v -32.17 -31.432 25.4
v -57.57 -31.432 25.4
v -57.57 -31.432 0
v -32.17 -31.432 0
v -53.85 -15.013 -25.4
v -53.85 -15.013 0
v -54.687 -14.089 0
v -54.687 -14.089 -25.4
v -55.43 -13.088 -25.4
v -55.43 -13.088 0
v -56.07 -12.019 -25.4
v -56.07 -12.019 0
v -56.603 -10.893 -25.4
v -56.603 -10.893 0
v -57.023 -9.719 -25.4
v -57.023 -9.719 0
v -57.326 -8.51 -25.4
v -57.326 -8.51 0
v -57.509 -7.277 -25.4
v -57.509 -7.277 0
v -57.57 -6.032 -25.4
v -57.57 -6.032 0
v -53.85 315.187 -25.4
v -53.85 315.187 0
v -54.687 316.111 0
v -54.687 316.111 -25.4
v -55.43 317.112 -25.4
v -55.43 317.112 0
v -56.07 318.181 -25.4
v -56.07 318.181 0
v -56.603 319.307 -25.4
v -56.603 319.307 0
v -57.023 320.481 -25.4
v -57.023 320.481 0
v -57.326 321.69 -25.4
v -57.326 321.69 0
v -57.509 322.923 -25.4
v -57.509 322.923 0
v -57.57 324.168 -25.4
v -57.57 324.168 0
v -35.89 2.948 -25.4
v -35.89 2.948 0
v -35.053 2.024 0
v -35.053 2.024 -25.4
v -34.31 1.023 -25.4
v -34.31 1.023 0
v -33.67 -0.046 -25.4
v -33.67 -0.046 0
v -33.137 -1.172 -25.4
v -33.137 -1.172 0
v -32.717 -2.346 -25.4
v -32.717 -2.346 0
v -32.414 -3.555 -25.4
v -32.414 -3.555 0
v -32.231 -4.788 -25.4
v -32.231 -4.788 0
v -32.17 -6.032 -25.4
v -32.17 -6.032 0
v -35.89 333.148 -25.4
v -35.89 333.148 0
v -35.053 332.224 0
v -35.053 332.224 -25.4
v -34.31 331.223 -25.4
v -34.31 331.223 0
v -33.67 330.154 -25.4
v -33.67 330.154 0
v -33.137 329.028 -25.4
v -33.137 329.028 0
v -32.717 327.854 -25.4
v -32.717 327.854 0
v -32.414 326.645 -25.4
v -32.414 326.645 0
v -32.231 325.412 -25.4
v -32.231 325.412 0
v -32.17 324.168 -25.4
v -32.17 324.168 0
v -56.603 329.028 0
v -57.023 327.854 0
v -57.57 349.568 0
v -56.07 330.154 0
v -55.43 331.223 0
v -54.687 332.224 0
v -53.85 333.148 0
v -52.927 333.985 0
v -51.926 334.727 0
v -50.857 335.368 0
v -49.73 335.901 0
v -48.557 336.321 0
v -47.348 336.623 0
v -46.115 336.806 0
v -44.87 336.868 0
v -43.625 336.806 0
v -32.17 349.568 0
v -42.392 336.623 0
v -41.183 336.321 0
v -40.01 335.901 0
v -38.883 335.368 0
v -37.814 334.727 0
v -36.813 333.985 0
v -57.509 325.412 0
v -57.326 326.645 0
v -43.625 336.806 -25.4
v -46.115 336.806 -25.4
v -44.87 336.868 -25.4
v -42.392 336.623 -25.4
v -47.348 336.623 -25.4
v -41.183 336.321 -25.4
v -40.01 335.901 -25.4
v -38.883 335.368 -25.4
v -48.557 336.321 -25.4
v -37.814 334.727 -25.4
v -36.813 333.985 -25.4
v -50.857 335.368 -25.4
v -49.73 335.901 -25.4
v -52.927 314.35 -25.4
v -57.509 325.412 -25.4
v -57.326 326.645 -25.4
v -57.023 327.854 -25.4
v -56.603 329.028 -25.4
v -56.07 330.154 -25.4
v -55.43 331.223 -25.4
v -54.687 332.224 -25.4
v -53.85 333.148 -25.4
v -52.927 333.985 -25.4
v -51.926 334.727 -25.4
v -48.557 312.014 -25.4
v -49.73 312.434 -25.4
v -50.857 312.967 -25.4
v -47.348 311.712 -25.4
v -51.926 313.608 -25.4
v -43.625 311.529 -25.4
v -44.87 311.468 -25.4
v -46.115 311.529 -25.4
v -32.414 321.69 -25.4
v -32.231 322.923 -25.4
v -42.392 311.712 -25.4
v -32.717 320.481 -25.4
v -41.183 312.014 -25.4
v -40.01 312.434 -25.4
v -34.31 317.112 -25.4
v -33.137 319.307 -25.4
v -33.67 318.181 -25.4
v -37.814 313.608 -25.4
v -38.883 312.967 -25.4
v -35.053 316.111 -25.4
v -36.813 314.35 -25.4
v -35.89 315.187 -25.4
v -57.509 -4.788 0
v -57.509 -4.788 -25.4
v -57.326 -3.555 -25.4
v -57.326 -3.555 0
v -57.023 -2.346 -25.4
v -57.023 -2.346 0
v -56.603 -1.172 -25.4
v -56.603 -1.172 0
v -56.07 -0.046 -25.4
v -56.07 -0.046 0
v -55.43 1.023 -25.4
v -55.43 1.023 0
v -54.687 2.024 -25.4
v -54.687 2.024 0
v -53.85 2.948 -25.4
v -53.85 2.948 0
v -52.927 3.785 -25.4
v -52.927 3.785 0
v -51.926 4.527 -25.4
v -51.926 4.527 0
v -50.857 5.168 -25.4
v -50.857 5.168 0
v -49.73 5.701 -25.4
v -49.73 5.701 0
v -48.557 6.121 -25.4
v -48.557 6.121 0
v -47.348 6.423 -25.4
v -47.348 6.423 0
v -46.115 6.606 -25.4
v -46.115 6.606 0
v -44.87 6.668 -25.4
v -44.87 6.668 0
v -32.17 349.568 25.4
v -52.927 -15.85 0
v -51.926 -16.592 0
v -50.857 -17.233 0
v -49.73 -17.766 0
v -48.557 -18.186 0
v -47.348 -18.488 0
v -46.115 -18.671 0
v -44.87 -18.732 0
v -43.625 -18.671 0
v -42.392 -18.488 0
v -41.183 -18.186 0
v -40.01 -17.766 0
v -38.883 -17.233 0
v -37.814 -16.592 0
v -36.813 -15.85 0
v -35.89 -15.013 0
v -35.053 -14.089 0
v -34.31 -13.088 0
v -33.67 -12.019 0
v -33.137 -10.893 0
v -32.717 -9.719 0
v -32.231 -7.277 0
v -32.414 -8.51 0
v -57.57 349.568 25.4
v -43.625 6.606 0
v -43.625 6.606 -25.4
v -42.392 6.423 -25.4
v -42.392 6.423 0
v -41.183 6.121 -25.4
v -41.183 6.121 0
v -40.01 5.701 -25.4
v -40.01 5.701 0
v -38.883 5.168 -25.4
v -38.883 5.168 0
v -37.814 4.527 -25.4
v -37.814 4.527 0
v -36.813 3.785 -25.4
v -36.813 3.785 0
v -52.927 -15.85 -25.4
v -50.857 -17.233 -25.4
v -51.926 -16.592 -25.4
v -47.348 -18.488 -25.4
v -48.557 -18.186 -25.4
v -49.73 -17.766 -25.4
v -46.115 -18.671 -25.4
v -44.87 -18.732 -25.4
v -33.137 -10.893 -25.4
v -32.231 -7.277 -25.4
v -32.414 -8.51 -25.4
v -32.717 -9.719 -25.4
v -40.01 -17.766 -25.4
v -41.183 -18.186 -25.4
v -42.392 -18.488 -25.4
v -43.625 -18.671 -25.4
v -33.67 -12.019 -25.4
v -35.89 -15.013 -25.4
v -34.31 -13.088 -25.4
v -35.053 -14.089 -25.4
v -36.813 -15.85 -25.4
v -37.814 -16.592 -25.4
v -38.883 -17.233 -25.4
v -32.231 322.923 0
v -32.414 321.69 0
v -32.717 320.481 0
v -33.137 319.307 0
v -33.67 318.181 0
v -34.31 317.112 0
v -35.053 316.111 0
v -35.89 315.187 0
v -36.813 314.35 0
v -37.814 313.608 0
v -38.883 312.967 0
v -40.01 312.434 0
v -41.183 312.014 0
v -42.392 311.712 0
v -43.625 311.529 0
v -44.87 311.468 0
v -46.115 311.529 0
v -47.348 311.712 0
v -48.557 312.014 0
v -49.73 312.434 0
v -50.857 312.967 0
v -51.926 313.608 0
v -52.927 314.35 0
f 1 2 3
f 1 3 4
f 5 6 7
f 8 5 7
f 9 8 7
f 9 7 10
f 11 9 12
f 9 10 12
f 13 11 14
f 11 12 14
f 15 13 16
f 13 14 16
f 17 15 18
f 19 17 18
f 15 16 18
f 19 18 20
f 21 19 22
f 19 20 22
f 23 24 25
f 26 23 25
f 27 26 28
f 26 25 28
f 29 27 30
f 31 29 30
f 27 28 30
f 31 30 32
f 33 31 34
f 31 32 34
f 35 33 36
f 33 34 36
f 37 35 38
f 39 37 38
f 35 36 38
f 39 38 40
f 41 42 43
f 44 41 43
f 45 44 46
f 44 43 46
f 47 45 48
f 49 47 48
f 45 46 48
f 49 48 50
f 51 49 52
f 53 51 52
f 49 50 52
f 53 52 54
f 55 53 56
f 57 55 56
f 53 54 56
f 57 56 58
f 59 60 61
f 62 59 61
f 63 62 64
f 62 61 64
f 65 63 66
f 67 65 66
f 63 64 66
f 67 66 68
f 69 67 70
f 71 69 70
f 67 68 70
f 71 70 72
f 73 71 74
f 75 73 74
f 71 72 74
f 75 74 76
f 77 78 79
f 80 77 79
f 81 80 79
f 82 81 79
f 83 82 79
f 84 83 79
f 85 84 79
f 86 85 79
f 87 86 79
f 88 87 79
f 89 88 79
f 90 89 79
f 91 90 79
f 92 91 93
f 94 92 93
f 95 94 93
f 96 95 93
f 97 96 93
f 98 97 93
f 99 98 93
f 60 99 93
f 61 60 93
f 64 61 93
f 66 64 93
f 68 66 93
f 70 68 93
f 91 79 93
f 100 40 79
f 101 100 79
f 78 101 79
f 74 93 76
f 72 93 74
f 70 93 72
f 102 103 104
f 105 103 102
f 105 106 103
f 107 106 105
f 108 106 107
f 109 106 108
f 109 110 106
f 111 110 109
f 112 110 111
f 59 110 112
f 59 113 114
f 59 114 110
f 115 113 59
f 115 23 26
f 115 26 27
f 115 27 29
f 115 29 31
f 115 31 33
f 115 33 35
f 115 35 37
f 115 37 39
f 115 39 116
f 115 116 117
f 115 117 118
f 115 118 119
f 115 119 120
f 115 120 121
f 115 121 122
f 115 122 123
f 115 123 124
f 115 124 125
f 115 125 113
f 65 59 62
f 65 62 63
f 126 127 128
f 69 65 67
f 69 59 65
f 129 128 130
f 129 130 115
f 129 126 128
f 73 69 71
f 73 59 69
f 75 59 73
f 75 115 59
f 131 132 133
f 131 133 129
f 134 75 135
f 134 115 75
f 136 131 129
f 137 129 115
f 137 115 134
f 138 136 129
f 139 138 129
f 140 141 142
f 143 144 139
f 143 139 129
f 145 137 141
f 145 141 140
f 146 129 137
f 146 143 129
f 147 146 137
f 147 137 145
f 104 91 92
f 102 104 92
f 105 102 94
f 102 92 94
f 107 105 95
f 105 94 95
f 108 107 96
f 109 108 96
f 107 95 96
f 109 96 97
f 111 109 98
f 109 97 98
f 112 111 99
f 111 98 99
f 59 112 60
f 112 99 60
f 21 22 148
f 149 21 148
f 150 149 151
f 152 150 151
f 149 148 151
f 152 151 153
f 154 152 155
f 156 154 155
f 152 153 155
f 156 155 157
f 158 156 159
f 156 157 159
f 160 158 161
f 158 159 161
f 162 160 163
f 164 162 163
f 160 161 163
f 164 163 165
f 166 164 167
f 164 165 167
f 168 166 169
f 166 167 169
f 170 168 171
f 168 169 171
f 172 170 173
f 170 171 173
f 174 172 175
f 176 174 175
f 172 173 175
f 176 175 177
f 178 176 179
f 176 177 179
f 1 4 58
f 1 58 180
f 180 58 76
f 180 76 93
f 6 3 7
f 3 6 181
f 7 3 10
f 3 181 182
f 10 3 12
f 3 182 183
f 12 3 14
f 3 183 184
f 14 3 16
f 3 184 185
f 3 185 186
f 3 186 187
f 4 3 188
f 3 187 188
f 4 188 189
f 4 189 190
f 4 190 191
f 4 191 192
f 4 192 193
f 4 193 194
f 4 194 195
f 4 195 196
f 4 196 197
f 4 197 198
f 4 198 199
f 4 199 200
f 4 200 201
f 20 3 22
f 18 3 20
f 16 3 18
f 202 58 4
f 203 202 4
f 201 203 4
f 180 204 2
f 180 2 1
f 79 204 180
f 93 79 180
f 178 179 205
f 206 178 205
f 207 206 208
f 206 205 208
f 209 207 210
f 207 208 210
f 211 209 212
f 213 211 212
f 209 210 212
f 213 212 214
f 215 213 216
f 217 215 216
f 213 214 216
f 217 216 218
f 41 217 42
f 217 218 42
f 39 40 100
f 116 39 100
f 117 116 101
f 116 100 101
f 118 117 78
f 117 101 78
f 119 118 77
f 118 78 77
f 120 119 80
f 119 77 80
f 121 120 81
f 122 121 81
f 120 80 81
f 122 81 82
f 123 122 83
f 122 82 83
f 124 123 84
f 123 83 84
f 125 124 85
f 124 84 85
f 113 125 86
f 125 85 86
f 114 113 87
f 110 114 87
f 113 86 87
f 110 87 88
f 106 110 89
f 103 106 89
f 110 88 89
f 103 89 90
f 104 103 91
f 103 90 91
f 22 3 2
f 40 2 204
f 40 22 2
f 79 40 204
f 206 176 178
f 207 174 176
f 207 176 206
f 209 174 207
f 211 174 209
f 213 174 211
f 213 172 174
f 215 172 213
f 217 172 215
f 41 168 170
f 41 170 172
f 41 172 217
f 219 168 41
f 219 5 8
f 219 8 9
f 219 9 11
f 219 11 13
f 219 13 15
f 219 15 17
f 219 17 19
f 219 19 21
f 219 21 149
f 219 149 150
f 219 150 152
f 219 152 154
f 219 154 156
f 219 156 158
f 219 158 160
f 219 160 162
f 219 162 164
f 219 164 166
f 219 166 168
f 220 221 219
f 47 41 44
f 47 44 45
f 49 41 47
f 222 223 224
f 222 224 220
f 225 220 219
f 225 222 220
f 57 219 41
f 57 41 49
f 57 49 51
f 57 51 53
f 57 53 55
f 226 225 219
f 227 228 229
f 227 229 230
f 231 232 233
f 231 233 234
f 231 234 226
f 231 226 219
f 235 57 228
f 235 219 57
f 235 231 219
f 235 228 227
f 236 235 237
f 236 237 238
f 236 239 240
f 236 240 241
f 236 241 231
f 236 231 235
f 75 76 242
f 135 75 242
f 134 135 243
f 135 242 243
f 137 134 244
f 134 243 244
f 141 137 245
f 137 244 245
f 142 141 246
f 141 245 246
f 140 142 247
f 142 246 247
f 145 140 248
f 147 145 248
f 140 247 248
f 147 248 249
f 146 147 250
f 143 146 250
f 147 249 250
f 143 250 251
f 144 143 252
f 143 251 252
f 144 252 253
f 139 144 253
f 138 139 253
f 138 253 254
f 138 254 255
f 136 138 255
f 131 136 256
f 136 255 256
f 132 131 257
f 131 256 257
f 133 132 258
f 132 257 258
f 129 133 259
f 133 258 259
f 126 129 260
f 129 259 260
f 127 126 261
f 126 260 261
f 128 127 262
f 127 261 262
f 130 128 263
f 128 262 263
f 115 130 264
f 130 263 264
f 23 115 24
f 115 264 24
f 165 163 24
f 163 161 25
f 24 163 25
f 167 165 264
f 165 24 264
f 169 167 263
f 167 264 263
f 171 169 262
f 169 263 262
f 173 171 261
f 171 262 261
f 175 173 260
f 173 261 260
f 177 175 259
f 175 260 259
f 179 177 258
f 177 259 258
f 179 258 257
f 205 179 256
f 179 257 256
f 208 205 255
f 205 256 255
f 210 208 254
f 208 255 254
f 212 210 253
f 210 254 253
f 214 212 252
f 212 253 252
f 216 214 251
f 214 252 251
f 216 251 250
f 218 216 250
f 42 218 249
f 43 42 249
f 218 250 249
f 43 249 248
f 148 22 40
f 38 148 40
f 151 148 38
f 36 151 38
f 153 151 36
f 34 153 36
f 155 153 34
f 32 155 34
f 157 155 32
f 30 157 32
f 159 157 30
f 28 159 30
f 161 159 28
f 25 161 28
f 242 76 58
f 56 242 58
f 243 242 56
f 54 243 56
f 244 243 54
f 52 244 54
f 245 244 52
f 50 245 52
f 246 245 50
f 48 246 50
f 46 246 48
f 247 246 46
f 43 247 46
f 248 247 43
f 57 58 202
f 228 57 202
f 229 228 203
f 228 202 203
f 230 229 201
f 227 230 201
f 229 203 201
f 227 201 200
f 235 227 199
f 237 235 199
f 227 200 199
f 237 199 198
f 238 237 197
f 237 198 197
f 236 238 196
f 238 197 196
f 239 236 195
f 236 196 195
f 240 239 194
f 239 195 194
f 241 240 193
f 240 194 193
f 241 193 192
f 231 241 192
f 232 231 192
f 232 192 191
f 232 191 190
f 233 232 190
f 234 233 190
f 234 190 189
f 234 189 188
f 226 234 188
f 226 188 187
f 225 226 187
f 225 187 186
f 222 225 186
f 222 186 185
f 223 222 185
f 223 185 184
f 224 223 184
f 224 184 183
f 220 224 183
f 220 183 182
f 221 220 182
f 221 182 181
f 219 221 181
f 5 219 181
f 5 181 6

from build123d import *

# Parameters (mm, degrees)
F0_R     = 12.7
F1_DEPTH = 25.4
F3_W     = 25.4
F3_H     = 381
F4_DEPTH = 25.4
F6_DEPTH = 50.8
F7_DEPTH = 25.4
F9_DEPTH = 25.4


with BuildPart() as f1:
    # F0 (on Top) → F1 (new body)
    with BuildSketch(Plane.XY):
        with Locations((-130.0663352013, -20.0254302472)):
            Circle(F0_R)
    extrude(amount=F1_DEPTH)


with BuildPart() as f4:
    # F3 (on Top) → F4 (new body)
    with BuildSketch(Plane.XY):
        with Locations((-44.869919461, 159.0675017536)):
            Rectangle(F3_W, F3_H)
    extrude(amount=F4_DEPTH)

    # F5 (on face) → F6 (join)
    with BuildSketch(Plane(origin=(0, 0, 0), x_dir=(1, 0, 0), z_dir=(0, 0, -1))):
        with BuildLine():
            ThreePointArc((-32.169919461, 6.0324982464), (-35.8896633399, 15.0127543675), (-44.869919461, 18.7324982464))
            ThreePointArc((-44.869919461, 18.7324982464), (-49.729999052, 17.7657683093), (-53.8501755821, 15.0127543675))
            Line((-53.8501755821, 15.0127543675), (-35.8896633399, -2.9477578746))
            ThreePointArc((-35.8896633399, -2.9477578746), (-33.1366493981, 1.1724186554), (-32.169919461, 6.0324982464))
        make_face()
        with BuildLine():
            ThreePointArc((-53.8501755821, 15.0127543675), (-56.6031895193, 10.8925778487), (-57.569919461, 6.0324982708))
            ThreePointArc((-57.569919461, 6.0324982708), (-53.8501755907, -2.947757866), (-44.869919461, -6.6675017536))
            ThreePointArc((-44.869919461, -6.6675017536), (-40.00983987, -5.7007718165), (-35.8896633399, -2.9477578746))
            Line((-35.8896633399, -2.9477578746), (-53.8501755821, 15.0127543675))
        make_face()
    extrude(amount=F6_DEPTH)

    # F7 (cut): a face of the model
    f7_faces = [f4.faces().sort_by_distance(p)[0] for p in [
        (-44.869919461, -6.0324982464, -50.8),
    ]]
    extrude(f7_faces, amount=-F7_DEPTH, mode=Mode.SUBTRACT)

    # F8 (on face) → F9 (join)
    with BuildSketch(Plane(origin=(0, 0, 0), x_dir=(1, 0, 0), z_dir=(0, 0, -1))):
        with BuildLine():
            ThreePointArc((-35.8896633399, -333.1477578746), (-33.1366493981, -329.0275813446), (-32.169919461, -324.1675017536))
            ThreePointArc((-32.169919461, -324.1675017536), (-35.8896633399, -315.1872456325), (-44.869919461, -311.4675017536))
            ThreePointArc((-44.869919461, -311.4675017536), (-49.729999052, -312.4342316907), (-53.8501755821, -315.1872456325))
            Line((-53.8501755821, -315.1872456325), (-35.8896633399, -333.1477578746))
        make_face()
        with BuildLine():
            ThreePointArc((-57.569919461, -324.1675017536), (-53.8501755821, -333.1477578746), (-44.869919461, -336.8675017536))
            ThreePointArc((-44.869919461, -336.8675017536), (-40.00983987, -335.9007718165), (-35.8896633399, -333.1477578746))
            Line((-35.8896633399, -333.1477578746), (-53.8501755821, -315.1872456325))
            ThreePointArc((-53.8501755821, -315.1872456325), (-56.6031895239, -319.3074221625), (-57.569919461, -324.1675017536))
        make_face()
    extrude(amount=F9_DEPTH)


solid = f4.part
